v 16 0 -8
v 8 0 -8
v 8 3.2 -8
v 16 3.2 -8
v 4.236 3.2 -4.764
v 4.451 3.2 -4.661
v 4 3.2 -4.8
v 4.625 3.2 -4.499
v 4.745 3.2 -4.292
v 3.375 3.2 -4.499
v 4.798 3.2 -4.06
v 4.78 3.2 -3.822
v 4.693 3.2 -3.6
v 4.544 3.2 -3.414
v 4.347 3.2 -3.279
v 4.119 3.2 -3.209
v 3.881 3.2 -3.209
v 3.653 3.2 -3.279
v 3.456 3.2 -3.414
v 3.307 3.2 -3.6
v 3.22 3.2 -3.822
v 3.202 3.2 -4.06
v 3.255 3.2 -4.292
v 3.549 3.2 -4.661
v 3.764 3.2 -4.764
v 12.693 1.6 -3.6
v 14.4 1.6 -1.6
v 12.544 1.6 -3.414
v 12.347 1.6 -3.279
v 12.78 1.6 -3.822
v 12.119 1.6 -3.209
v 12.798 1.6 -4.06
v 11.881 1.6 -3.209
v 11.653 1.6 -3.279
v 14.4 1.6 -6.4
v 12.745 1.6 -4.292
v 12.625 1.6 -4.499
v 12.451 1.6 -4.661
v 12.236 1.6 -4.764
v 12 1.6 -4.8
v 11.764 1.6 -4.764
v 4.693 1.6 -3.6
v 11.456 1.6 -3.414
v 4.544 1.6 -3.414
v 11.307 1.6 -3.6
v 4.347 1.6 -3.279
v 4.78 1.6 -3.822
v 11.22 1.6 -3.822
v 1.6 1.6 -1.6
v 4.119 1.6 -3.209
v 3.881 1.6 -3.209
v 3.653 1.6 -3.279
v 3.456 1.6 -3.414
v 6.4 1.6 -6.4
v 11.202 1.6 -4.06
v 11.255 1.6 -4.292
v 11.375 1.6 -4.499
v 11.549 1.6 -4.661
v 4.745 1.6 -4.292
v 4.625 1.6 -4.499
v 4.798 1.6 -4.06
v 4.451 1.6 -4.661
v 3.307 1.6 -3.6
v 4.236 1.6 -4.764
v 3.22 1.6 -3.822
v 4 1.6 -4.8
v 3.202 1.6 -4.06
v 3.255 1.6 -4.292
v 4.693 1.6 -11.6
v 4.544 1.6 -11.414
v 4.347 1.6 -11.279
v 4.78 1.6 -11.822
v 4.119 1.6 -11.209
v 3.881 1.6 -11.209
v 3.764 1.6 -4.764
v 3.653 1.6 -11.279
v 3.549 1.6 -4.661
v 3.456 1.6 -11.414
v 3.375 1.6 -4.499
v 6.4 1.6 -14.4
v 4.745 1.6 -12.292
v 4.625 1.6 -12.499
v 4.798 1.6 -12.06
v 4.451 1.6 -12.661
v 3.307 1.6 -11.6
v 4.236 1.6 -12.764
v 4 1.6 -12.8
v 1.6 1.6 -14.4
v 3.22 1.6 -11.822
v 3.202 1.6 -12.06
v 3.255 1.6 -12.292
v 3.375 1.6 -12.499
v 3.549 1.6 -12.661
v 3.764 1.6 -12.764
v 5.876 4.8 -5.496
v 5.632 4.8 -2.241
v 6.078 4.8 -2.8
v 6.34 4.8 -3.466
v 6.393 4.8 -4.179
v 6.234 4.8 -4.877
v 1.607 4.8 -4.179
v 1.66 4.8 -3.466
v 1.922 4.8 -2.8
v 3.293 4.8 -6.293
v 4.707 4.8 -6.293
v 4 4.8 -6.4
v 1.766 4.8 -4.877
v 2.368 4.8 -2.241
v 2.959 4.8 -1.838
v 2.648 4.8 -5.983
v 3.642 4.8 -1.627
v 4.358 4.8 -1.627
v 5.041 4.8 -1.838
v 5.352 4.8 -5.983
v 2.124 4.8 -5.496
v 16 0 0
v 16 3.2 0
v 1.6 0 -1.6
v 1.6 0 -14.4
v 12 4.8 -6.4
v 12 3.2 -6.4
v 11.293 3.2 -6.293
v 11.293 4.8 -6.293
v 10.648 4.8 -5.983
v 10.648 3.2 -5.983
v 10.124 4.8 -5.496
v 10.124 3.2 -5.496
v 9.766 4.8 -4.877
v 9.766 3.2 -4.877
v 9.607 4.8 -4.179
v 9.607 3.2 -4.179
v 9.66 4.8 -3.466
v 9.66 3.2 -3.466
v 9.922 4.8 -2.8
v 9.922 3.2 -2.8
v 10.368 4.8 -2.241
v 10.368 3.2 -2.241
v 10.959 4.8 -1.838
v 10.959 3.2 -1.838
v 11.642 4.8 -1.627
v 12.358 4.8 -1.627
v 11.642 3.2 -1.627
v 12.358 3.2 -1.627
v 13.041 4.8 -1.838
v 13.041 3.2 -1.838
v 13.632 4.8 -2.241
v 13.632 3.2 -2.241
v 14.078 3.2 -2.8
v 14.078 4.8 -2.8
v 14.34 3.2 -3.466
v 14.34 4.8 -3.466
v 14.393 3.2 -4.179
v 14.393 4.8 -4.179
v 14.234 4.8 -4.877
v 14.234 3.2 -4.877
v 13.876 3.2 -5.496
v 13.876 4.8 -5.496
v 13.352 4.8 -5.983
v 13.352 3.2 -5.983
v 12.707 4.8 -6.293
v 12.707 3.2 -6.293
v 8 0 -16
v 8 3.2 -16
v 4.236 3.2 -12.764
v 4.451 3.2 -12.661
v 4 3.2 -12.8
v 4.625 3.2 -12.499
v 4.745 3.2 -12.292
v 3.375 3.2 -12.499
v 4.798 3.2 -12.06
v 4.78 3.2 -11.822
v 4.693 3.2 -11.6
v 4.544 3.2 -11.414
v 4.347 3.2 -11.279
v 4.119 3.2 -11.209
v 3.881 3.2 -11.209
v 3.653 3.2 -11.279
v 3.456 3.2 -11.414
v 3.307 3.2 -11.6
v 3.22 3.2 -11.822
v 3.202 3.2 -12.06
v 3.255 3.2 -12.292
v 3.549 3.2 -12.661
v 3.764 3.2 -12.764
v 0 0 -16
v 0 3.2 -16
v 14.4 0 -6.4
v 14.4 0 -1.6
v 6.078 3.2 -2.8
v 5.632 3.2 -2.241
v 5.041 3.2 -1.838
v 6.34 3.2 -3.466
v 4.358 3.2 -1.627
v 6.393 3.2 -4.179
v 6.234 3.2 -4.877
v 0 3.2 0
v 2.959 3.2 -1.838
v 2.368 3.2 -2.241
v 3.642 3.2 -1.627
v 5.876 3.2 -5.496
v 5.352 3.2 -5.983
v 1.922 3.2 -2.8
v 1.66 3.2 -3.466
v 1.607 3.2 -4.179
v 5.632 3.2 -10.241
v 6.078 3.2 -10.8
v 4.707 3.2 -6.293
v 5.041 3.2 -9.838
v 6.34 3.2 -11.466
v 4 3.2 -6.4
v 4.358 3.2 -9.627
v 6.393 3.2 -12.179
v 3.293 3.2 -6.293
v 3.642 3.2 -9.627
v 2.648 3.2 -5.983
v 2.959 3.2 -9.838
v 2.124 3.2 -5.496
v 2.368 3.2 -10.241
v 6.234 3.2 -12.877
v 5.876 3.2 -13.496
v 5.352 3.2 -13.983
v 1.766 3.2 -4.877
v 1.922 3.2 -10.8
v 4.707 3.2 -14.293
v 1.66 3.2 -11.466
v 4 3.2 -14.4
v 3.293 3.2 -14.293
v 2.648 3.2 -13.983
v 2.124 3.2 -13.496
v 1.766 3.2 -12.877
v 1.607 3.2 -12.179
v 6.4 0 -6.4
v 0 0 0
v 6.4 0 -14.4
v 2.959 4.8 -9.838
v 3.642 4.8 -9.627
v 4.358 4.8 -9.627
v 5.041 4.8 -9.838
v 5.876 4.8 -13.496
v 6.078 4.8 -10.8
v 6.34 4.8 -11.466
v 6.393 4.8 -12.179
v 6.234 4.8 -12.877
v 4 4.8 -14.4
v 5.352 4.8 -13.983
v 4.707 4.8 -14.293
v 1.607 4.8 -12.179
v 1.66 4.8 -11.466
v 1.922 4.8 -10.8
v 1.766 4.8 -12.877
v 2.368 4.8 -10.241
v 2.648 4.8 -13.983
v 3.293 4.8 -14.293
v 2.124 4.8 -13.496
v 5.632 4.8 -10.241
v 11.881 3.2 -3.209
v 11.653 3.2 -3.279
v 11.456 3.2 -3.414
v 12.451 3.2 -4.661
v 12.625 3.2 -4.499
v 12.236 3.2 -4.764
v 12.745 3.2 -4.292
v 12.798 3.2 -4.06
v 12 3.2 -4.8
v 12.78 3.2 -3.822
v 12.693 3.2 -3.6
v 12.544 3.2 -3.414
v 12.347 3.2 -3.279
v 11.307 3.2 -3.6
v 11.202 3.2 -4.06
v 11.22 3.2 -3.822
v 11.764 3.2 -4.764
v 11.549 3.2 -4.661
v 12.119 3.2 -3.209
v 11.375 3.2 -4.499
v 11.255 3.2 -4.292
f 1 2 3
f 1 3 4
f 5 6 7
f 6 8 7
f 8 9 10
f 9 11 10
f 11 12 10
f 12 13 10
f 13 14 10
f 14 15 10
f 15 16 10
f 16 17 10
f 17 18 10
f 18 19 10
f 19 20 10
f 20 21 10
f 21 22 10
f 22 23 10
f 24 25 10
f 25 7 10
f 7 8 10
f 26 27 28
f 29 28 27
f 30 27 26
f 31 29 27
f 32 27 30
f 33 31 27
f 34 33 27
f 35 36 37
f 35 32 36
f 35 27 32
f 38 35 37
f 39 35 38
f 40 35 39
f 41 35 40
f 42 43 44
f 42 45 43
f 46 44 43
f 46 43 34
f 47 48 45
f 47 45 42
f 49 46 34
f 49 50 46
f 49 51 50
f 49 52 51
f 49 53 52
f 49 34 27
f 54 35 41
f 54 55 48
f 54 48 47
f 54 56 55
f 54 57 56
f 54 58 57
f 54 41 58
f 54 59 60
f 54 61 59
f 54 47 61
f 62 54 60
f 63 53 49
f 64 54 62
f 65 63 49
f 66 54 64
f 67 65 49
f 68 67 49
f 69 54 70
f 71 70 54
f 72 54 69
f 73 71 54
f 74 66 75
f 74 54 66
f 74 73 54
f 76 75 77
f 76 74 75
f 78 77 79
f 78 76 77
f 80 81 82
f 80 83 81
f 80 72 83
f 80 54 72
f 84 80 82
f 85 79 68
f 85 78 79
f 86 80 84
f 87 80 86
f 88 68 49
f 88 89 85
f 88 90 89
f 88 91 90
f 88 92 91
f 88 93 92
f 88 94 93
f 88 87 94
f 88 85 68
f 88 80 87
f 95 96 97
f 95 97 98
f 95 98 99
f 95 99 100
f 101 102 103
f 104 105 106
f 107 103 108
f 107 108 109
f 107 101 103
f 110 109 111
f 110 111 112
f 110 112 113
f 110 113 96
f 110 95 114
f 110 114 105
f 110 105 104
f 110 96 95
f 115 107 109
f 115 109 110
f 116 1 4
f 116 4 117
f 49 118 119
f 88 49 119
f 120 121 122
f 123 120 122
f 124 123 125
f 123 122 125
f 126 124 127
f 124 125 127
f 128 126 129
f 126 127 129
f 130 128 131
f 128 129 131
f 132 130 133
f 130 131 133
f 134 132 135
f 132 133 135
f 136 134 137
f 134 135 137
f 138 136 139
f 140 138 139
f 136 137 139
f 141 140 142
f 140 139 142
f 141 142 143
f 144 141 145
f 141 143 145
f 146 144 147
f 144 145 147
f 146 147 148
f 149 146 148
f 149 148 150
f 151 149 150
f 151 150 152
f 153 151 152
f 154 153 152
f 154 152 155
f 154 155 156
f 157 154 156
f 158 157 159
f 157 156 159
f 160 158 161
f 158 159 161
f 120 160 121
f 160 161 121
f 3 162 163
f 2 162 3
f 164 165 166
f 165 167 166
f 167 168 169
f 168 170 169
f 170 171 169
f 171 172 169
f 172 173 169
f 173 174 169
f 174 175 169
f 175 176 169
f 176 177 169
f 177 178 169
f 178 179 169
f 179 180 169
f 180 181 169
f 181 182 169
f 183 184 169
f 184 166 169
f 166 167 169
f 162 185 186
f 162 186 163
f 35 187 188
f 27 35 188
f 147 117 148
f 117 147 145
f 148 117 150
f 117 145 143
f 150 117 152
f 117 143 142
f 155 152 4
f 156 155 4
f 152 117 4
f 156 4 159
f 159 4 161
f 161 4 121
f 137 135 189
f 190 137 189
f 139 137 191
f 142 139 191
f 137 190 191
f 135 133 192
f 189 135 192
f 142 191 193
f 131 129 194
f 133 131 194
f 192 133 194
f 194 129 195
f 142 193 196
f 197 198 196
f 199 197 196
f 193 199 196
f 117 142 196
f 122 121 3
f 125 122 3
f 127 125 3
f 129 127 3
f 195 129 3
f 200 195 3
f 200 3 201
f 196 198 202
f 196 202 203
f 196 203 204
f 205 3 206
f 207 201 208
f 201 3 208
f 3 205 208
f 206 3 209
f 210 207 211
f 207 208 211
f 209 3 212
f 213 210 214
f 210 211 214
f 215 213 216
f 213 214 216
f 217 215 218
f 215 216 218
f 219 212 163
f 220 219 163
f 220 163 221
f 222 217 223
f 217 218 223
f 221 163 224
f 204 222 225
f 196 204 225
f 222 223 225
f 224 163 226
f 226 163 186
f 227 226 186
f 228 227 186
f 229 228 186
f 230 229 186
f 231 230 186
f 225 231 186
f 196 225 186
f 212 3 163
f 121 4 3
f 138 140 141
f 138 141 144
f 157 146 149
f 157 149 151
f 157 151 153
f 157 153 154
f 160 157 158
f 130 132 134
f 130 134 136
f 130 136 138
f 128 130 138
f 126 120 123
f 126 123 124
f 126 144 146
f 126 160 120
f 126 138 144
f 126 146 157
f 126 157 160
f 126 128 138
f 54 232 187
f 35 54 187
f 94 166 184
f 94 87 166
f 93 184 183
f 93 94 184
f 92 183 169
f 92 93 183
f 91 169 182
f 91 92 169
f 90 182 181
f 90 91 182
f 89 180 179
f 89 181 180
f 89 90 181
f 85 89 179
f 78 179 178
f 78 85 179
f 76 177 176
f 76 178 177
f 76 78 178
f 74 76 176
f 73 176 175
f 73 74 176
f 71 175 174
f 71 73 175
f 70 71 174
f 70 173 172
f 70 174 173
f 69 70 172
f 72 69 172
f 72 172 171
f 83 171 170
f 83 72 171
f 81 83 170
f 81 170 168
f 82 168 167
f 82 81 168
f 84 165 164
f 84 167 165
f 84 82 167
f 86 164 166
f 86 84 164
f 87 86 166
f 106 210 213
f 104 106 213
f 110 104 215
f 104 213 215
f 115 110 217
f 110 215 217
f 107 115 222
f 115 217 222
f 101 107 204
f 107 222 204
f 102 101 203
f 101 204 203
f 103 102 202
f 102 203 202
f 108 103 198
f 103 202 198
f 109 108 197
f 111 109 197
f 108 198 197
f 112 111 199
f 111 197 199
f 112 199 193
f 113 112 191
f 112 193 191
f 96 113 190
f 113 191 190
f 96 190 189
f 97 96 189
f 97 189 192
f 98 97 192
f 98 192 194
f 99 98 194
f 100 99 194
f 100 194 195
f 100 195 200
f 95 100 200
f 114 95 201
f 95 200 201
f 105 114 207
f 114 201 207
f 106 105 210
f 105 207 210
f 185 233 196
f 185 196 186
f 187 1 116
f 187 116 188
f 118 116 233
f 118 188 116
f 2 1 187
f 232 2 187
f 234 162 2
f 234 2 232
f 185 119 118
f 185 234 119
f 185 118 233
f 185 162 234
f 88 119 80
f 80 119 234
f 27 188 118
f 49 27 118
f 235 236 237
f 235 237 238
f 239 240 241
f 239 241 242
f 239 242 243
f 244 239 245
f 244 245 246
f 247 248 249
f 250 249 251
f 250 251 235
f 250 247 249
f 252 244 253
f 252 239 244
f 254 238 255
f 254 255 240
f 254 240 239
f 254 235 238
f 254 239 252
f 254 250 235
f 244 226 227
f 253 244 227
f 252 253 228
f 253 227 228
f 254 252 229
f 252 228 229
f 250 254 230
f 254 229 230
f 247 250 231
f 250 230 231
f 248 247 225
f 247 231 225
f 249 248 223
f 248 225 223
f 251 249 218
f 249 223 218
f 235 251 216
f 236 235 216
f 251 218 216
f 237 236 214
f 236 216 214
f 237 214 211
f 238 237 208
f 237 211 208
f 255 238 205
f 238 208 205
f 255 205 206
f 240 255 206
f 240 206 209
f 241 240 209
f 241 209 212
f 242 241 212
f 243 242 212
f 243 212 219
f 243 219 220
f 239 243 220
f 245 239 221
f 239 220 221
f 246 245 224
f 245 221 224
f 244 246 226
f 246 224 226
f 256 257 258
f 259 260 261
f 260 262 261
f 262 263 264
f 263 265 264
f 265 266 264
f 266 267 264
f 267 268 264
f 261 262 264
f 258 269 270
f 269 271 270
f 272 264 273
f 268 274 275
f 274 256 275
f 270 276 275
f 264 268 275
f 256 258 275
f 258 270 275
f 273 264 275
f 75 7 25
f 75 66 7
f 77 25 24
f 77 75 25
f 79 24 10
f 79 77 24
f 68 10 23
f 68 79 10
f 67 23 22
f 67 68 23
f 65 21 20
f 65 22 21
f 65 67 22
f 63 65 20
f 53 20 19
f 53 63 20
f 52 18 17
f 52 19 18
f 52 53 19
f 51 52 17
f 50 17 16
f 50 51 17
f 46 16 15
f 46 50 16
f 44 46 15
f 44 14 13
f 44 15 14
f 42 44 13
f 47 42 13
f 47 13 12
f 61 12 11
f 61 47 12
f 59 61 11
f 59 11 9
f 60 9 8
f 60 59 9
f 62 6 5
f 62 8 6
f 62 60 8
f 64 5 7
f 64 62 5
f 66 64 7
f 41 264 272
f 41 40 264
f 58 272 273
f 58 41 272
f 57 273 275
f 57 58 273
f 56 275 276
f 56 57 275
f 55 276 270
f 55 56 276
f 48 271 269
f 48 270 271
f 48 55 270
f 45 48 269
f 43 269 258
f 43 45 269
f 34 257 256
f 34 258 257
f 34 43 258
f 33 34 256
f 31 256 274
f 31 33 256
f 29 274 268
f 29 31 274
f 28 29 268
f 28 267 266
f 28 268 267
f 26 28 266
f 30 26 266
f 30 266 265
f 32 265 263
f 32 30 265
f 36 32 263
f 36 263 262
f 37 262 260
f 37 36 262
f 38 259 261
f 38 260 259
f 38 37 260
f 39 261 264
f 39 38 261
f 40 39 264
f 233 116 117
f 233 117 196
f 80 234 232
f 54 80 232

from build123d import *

# Parameters (mm, degrees)
BOSS_EXTRUDE1_DEPTH = 3.2
SKETCH2_R           = 2.4
BOSS_EXTRUDE2_DEPTH = 1.6
SHELL1_T            = -1.6


with BuildPart() as part:
    # Sketch1 → Boss-Extrude1 (new body)
    with BuildSketch(Plane(origin=(0, 0, 0), x_dir=(1, 0, 0), z_dir=(0, 1, 0))):
        Polygon((0, 0), (0, 16), (8, 16), (8, 8), (16, 8), (16, 0), align=None)
    extrude(amount=BOSS_EXTRUDE1_DEPTH)

    # Sketch2 → Boss-Extrude2 (add)
    with BuildSketch(Plane(origin=(0, 3.2, 0), x_dir=(1, 0, 0), z_dir=(0, 1, 0))):
        with Locations(Location((4, 4, 0), (0, 0, 90))):
            Circle(SKETCH2_R)
        with Locations(Location((4, 12, 0), (0, 0, 90))):
            Circle(SKETCH2_R)
        with Locations(Location((12, 4, 0), (0, 0, 90))):
            Circle(SKETCH2_R)
    extrude(amount=BOSS_EXTRUDE2_DEPTH)

    # Shell1
    shell1_openings = [part.faces().sort_by_distance(p)[0] for p in [
        (6.666666667, 0, -6.666666667),
    ]]
    offset(amount=SHELL1_T, openings=shell1_openings, kind=Kind.INTERSECTION)


solid = part.part
